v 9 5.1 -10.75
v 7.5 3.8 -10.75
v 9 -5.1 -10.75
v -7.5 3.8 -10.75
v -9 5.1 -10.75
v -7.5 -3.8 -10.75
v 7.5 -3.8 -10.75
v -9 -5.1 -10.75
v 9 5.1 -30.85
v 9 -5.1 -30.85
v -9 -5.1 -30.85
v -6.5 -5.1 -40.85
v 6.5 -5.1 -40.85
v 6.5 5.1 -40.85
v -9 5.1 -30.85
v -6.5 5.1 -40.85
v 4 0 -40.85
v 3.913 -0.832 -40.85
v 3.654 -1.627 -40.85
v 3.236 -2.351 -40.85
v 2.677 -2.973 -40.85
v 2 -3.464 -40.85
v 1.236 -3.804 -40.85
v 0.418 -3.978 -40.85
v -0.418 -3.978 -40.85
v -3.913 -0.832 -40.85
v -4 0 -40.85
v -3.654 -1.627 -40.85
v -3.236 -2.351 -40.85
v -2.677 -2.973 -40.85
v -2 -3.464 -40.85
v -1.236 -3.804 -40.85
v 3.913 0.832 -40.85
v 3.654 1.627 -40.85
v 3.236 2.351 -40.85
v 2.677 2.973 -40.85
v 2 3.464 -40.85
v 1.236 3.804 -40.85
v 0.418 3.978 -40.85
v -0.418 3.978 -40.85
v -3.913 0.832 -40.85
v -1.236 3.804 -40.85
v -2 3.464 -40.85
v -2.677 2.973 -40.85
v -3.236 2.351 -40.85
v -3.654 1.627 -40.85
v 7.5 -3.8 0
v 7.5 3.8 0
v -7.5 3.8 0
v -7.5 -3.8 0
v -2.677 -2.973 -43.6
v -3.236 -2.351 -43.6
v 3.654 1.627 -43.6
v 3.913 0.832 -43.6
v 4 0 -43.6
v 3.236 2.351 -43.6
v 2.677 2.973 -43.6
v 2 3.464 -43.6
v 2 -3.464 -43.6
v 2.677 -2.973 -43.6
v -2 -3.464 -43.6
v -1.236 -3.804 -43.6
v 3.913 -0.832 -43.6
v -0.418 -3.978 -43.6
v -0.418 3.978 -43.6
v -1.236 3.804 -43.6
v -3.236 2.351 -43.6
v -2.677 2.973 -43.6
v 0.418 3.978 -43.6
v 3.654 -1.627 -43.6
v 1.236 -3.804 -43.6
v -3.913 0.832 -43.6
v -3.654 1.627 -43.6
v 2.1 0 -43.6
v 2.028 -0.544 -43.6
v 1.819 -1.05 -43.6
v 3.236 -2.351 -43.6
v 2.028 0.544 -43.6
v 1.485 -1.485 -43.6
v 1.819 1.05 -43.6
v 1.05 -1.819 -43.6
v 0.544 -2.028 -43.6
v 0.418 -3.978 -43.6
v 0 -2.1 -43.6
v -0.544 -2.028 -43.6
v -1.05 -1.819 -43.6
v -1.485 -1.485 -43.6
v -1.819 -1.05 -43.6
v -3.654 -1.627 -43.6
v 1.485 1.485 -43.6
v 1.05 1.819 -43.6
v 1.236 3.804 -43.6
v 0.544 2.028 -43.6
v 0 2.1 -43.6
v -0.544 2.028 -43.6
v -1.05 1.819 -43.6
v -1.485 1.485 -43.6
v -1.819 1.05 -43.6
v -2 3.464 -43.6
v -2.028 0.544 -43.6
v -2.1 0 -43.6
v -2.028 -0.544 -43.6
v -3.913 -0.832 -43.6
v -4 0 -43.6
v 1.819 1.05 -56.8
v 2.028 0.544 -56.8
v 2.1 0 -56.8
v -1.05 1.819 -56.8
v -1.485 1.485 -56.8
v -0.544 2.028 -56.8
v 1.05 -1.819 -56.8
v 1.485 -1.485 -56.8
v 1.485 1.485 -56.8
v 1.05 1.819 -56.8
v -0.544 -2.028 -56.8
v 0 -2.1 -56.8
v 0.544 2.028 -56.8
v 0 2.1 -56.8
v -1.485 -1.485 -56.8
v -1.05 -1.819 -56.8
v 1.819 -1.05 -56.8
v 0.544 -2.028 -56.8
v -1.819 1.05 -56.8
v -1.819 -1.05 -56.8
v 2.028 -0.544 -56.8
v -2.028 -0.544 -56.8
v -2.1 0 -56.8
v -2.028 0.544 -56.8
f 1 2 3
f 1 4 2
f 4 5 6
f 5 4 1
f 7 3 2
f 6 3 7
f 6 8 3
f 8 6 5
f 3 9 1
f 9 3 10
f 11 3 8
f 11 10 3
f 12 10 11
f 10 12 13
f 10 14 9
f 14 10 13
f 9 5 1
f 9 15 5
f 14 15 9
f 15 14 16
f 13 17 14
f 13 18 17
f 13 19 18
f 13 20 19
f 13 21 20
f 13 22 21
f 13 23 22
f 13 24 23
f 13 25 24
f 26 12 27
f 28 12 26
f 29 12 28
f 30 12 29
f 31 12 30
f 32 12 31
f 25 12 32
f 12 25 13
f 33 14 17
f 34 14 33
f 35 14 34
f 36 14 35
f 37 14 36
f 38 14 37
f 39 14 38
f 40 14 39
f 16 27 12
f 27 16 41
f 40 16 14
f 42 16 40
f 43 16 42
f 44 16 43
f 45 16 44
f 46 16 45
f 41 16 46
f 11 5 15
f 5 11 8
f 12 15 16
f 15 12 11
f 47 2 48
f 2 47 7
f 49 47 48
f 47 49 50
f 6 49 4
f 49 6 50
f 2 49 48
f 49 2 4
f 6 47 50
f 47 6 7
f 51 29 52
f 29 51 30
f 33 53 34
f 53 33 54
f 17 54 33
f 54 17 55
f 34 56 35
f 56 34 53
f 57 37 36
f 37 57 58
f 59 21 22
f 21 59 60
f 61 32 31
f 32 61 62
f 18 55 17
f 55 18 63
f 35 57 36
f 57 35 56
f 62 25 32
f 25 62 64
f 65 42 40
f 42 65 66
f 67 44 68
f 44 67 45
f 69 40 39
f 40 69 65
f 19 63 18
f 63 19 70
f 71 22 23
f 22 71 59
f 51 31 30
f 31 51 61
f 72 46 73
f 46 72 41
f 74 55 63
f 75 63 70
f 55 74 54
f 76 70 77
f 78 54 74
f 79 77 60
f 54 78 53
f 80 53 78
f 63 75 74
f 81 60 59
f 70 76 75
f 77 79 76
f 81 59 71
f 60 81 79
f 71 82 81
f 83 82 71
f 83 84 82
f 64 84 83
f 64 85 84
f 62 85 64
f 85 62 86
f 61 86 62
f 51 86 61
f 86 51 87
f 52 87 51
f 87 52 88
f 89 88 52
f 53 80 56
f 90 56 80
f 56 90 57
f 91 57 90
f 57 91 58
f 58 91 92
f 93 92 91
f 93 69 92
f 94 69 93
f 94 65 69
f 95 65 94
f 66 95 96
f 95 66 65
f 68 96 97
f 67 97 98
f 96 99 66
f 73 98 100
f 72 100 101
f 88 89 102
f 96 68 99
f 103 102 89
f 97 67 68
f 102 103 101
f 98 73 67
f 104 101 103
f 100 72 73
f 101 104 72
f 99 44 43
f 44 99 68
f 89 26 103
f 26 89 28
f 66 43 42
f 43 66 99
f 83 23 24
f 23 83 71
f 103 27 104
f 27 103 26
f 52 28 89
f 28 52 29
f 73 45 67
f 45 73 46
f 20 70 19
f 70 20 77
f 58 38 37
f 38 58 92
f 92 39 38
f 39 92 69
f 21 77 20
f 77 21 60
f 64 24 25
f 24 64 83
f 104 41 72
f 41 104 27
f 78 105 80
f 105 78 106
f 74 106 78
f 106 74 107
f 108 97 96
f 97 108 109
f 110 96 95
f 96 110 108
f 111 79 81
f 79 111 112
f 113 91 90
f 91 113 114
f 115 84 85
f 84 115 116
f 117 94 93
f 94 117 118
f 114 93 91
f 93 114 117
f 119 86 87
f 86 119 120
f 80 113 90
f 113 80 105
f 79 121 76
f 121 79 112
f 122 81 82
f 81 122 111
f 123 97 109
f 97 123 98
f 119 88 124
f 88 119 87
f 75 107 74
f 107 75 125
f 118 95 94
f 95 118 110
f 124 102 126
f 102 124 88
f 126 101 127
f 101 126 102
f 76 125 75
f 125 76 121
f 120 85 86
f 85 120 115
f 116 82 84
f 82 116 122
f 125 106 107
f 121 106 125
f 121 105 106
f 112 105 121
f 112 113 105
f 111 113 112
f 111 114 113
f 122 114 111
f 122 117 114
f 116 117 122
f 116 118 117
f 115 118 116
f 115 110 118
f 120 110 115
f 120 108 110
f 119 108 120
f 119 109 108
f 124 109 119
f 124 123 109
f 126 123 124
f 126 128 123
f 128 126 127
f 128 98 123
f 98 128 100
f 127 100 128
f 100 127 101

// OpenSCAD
//freeboxUSB();
cableUSB();

module freeboxUSB() {
    translate([0, 0, -28.4]) union() {
        translate([0, 0, 28.4/2]) cube([17.8, 10.4, 28.4], center=true);
        translate([-2.4/2, 10.4/2, 0]) cube([2.4, 2.0, 24.0]);
        translate([0, 0, -5.4]) cylinder(d=6.0, h=5.4, $fn=30);
        translate([0, 0, -16]) cylinder(d=4.0, h=16, $fn=24);
    }
}

module cableUSB() {
    translate([0, 0, -40.8]) {
        hull() {
            cube([13.0, 10.2, 0.1], center=true);
            translate([0, 0, 10]) cube([18.0, 10.2, 0.1], center=true);
            translate([0, 0, 30]) cube([18.0, 10.2, 0.1], center=true);
        }
        translate([0, 0, 30+10.8/2]) cube([15.0, 7.6, 10.8], center=true);
        translate([0, 0, -2.8]) cylinder(d=8.0, h=2.8, $fn=30);
        translate([0, 0, -16]) cylinder(d=4.2, h=16, $fn=24);
    }
}
